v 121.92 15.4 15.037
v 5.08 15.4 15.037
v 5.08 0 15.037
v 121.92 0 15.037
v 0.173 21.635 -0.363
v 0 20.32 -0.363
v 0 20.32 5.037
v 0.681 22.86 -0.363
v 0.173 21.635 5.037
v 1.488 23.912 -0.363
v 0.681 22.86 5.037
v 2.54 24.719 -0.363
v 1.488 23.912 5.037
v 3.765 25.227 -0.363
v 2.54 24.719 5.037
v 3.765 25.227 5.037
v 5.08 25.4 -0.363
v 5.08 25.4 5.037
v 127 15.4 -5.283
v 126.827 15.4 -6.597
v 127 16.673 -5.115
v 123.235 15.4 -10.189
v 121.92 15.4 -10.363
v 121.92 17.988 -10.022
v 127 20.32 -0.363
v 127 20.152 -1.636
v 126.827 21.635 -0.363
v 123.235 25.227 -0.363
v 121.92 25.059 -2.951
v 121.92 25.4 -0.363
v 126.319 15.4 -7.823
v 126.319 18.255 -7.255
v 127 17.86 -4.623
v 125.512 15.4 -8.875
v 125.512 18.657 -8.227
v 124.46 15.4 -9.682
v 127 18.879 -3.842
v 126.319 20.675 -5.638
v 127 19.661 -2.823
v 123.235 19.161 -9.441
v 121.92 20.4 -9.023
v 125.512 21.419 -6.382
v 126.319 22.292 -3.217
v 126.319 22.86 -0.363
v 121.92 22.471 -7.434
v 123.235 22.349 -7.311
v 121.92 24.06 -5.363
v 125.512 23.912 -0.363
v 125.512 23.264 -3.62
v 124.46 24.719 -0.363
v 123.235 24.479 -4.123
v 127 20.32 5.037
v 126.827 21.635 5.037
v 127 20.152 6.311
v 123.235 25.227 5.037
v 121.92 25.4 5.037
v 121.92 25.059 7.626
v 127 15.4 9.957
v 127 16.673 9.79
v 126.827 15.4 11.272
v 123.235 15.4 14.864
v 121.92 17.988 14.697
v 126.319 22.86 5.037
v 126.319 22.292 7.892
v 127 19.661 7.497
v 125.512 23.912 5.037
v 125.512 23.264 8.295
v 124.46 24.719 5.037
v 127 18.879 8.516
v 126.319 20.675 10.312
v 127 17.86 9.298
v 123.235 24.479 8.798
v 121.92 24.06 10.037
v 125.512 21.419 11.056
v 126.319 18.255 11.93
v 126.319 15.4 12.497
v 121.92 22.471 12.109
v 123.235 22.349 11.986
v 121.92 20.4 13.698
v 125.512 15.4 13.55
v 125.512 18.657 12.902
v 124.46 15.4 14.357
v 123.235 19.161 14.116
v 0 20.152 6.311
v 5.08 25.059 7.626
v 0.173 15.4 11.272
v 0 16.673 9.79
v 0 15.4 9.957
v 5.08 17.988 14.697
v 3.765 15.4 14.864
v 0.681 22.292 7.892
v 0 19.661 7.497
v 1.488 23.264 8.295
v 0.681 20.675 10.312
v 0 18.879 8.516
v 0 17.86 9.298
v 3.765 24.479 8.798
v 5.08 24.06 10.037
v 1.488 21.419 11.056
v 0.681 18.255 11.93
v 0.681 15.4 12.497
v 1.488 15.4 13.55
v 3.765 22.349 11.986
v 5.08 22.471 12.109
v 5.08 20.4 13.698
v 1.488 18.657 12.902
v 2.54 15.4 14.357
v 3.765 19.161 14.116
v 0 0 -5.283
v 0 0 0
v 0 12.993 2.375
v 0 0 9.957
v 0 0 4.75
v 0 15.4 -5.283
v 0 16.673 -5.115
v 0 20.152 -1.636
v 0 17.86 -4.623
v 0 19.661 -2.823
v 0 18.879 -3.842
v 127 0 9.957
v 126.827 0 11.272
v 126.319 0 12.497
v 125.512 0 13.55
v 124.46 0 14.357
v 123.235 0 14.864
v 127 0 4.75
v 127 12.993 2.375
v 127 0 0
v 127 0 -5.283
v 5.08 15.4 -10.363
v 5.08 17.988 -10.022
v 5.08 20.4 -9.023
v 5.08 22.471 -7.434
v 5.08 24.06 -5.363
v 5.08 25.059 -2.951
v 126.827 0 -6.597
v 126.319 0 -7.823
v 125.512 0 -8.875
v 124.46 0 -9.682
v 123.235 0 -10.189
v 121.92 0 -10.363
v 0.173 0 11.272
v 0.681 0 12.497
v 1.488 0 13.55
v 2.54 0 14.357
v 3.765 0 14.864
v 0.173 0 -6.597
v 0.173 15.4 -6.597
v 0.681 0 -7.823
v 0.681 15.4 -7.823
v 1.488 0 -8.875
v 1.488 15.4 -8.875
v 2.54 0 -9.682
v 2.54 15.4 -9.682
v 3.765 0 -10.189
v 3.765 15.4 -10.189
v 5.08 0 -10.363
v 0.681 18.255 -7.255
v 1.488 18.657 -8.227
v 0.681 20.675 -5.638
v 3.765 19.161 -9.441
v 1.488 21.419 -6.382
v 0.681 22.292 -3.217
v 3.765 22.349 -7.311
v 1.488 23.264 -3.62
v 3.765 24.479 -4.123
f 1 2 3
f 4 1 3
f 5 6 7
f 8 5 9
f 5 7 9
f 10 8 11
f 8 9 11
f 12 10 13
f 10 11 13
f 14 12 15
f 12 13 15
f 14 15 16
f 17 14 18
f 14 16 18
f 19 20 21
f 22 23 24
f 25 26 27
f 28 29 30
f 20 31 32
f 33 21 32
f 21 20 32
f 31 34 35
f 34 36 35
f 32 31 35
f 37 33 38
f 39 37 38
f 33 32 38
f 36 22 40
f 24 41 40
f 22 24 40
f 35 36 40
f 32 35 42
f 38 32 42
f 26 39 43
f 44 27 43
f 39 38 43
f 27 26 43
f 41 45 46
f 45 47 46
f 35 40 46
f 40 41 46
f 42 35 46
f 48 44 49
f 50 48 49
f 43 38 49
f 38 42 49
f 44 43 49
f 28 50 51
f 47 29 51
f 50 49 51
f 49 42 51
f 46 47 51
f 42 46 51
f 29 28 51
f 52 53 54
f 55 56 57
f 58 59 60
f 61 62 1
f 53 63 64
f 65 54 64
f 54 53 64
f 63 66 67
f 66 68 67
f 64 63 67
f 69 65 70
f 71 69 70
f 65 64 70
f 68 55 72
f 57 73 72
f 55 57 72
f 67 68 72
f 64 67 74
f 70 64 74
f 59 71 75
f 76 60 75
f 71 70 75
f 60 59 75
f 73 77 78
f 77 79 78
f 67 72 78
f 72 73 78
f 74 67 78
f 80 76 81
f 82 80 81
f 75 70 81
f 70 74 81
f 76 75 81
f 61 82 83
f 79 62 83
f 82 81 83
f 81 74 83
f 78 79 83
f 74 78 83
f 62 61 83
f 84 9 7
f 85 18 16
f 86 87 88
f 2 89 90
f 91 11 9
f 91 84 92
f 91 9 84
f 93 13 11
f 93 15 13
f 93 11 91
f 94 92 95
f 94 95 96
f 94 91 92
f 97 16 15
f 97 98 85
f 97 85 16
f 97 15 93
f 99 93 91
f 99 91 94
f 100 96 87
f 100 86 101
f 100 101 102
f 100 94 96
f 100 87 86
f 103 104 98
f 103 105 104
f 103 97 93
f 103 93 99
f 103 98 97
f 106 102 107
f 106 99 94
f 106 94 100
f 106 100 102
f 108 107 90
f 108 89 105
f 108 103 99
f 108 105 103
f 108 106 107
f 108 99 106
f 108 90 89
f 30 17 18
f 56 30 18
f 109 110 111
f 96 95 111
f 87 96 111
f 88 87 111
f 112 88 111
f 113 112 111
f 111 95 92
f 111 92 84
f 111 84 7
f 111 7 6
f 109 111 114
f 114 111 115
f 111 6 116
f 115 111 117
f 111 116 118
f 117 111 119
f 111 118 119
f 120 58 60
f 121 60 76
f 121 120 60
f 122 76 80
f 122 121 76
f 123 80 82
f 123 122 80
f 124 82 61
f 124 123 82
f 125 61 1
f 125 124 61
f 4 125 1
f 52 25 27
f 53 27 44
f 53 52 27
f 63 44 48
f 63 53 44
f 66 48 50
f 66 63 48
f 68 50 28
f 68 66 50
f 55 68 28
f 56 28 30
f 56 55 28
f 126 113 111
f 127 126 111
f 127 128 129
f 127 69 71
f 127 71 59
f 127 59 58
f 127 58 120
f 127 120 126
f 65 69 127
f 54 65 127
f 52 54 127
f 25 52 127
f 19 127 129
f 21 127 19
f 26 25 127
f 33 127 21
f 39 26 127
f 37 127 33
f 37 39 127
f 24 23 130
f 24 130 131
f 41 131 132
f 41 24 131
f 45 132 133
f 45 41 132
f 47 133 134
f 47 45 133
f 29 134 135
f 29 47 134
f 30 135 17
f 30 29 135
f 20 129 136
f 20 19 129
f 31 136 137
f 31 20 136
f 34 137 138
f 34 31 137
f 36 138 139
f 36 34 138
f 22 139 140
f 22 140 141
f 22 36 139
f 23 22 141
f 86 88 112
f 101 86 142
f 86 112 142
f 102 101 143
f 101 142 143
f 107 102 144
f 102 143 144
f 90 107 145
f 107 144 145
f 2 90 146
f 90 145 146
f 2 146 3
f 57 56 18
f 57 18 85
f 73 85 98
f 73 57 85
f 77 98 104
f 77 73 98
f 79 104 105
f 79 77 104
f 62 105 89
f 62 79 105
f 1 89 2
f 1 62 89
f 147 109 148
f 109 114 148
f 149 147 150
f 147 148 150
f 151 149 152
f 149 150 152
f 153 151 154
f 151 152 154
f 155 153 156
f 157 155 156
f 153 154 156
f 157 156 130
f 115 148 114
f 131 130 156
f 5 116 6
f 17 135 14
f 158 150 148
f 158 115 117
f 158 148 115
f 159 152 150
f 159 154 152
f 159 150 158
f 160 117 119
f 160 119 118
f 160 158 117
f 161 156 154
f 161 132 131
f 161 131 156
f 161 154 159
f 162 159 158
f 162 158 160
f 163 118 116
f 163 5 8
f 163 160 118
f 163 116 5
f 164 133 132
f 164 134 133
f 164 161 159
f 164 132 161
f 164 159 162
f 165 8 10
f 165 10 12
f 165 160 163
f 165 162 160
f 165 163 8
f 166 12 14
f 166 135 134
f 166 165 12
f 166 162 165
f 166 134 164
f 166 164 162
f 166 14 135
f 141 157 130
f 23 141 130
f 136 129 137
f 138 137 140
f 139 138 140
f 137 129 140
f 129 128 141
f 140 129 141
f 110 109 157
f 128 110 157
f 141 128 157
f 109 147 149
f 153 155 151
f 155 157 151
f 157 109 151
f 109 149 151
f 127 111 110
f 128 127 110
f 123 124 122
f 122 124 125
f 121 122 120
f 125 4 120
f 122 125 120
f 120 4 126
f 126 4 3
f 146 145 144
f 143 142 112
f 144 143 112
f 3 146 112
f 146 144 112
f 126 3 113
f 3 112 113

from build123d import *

# Parameters (mm, degrees)
BOSS_EXTRUDE1_DEPTH = 127
FILLET3_R           = 10
FILLET4_R           = 5.08


with BuildPart() as part:
    # Sketch1 → Boss-Extrude1 (new body)
    with BuildSketch(Plane(origin=(0, 0, 0), x_dir=(0, 0, -1), z_dir=(1, 0, 0))):
        Polygon((-4.750453706, 0), (-2.375226853, 12.992673374), (0, 0), (10.362546294, 0), (10.362546294, 25.4), (-15.037453706, 25.4), (-15.037453706, 0), align=None)
    extrude(amount=BOSS_EXTRUDE1_DEPTH)

    # Fillet3
    fillet3_edges = [part.edges().sort_by_distance(p)[0] for p in [
        (63.5, 25.4, 15.037453706),
        (63.5, 25.4, -10.362546294),
    ]]
    fillet(fillet3_edges, radius=FILLET3_R)

    # Fillet4
    fillet4_edges = [part.edges().sort_by_distance(p)[0] for p in [
        (0, 25.4, 2.337453706),
        (0, 7.7, -10.362546294),
        (0, 22.471067812, -7.433614106),
        (0, 22.471067812, 12.108521518),
        (127, 25.4, 2.337453706),
        (127, 7.7, -10.362546294),
        (127, 22.471067812, -7.433614106),
        (127, 22.471067812, 12.108521518),
        (127, 7.7, 15.037453706),
        (0, 7.7, 15.037453706),
    ]]
    fillet(fillet4_edges, radius=FILLET4_R)


solid = part.part
